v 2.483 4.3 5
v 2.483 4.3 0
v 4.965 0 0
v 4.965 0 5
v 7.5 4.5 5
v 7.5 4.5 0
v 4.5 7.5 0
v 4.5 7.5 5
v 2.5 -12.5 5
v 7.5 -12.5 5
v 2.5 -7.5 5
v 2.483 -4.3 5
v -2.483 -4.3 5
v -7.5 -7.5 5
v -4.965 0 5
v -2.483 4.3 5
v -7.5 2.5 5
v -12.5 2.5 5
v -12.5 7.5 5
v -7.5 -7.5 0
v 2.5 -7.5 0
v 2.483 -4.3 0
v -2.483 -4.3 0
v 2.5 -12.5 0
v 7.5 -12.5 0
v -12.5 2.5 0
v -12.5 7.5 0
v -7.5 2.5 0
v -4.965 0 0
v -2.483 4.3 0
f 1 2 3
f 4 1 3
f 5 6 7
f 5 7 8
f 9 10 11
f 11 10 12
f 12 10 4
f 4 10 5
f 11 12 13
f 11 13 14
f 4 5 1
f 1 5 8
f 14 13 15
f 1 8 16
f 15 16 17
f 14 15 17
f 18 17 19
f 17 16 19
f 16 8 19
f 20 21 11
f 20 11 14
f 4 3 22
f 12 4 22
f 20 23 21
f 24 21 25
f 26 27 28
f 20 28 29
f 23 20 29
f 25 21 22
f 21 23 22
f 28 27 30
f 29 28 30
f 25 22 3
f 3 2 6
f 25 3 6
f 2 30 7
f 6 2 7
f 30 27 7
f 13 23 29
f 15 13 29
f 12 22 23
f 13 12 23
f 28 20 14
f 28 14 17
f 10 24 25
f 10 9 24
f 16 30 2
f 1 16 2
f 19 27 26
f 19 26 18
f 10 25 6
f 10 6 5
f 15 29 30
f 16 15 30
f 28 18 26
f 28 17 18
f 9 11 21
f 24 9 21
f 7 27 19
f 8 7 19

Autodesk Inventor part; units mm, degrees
sketch "Sketch1" plane through (0, 0, 0) normal (0, 0, 1) x (1, 0, 0)
  line L0 (0, 2.8582) -> (0, -2.8582) construction
  line L1 (-5.7775, 0) -> (5.7775, 0) construction
  point P0 (0, 0)
  point P1 (0, 0)
sketch "Sketch2" plane through (0, 0, 0) normal (0, 0, 1) x (1, 0, 0)
  line L0 (2.4826, 4.3) -> (4.9652, 0)
  line L1 (4.9652, 0) -> (2.4826, -4.3)
  line L2 (2.4826, -4.3) -> (-2.4826, -4.3)
  line L3 (-2.4826, -4.3) -> (-4.9652, 0)
  line L4 (-4.9652, 0) -> (-2.4826, 4.3)
  line L5 (-2.4826, 4.3) -> (2.4826, 4.3)
  line L6 (-7.5, 7.5) -> (7.5, 7.5)
  line L7 (7.5, 7.5) -> (7.5, -7.5)
  line L8 (7.5, -7.5) -> (-7.5, -7.5)
  line L9 (-7.5, -7.5) -> (-7.5, 7.5)
  line L10 (-7.5, 7.5) -> (7.5, -7.5) construction
  line L11 (7.5, 7.5) -> (-7.5, -7.5) construction
  point P0 (0, 0)
  point P1 (0, 0)
  dimension "d0" = 8.6
  dimension "d1" = 15
  dimension "d2" = 15
extrude "Extrusion1" add sketch "Sketch2" along normal blind 5
chamfer "Chamfer1" distance 3 angle 45 1 edges at (7.5, 7.5, 2.5)
sketch "Sketch3" plane through (-7.5, -7.5, 0) normal (-1, 0, 0) x (0, 0, 1)
  line L0 (0, 15) -> (5, 15)
  line L1 (5, 15) -> (5, 10)
  line L2 (5, 10) -> (0, 10)
  line L3 (0, 10) -> (0, 15)
  point P0 (0, 7.5)
  dimension "d8" = 5
  dimension "d9" = 5
extrude "Extrusion2" add sketch "Sketch3" along normal blind 5
sketch "Sketch4" plane through (-7.5, -7.5, 0) normal (0, -1, 0) x (1, 0, 0)
  line L0 (15, 0) -> (15, 5) projected
  line L1 (15, 5) -> (10, 5)
  line L2 (10, 5) -> (10, 0)
  line L3 (10, 0) -> (15, 0)
  line L4 (15, 0) -> (15, 5)
  point P0 (7.5, 0)
  dimension "d12" = 5
  dimension "d13" = 5
extrude "Extrusion3" add sketch "Sketch4" along normal blind 5
properties part number "bevestiging deksel" material "S235"
